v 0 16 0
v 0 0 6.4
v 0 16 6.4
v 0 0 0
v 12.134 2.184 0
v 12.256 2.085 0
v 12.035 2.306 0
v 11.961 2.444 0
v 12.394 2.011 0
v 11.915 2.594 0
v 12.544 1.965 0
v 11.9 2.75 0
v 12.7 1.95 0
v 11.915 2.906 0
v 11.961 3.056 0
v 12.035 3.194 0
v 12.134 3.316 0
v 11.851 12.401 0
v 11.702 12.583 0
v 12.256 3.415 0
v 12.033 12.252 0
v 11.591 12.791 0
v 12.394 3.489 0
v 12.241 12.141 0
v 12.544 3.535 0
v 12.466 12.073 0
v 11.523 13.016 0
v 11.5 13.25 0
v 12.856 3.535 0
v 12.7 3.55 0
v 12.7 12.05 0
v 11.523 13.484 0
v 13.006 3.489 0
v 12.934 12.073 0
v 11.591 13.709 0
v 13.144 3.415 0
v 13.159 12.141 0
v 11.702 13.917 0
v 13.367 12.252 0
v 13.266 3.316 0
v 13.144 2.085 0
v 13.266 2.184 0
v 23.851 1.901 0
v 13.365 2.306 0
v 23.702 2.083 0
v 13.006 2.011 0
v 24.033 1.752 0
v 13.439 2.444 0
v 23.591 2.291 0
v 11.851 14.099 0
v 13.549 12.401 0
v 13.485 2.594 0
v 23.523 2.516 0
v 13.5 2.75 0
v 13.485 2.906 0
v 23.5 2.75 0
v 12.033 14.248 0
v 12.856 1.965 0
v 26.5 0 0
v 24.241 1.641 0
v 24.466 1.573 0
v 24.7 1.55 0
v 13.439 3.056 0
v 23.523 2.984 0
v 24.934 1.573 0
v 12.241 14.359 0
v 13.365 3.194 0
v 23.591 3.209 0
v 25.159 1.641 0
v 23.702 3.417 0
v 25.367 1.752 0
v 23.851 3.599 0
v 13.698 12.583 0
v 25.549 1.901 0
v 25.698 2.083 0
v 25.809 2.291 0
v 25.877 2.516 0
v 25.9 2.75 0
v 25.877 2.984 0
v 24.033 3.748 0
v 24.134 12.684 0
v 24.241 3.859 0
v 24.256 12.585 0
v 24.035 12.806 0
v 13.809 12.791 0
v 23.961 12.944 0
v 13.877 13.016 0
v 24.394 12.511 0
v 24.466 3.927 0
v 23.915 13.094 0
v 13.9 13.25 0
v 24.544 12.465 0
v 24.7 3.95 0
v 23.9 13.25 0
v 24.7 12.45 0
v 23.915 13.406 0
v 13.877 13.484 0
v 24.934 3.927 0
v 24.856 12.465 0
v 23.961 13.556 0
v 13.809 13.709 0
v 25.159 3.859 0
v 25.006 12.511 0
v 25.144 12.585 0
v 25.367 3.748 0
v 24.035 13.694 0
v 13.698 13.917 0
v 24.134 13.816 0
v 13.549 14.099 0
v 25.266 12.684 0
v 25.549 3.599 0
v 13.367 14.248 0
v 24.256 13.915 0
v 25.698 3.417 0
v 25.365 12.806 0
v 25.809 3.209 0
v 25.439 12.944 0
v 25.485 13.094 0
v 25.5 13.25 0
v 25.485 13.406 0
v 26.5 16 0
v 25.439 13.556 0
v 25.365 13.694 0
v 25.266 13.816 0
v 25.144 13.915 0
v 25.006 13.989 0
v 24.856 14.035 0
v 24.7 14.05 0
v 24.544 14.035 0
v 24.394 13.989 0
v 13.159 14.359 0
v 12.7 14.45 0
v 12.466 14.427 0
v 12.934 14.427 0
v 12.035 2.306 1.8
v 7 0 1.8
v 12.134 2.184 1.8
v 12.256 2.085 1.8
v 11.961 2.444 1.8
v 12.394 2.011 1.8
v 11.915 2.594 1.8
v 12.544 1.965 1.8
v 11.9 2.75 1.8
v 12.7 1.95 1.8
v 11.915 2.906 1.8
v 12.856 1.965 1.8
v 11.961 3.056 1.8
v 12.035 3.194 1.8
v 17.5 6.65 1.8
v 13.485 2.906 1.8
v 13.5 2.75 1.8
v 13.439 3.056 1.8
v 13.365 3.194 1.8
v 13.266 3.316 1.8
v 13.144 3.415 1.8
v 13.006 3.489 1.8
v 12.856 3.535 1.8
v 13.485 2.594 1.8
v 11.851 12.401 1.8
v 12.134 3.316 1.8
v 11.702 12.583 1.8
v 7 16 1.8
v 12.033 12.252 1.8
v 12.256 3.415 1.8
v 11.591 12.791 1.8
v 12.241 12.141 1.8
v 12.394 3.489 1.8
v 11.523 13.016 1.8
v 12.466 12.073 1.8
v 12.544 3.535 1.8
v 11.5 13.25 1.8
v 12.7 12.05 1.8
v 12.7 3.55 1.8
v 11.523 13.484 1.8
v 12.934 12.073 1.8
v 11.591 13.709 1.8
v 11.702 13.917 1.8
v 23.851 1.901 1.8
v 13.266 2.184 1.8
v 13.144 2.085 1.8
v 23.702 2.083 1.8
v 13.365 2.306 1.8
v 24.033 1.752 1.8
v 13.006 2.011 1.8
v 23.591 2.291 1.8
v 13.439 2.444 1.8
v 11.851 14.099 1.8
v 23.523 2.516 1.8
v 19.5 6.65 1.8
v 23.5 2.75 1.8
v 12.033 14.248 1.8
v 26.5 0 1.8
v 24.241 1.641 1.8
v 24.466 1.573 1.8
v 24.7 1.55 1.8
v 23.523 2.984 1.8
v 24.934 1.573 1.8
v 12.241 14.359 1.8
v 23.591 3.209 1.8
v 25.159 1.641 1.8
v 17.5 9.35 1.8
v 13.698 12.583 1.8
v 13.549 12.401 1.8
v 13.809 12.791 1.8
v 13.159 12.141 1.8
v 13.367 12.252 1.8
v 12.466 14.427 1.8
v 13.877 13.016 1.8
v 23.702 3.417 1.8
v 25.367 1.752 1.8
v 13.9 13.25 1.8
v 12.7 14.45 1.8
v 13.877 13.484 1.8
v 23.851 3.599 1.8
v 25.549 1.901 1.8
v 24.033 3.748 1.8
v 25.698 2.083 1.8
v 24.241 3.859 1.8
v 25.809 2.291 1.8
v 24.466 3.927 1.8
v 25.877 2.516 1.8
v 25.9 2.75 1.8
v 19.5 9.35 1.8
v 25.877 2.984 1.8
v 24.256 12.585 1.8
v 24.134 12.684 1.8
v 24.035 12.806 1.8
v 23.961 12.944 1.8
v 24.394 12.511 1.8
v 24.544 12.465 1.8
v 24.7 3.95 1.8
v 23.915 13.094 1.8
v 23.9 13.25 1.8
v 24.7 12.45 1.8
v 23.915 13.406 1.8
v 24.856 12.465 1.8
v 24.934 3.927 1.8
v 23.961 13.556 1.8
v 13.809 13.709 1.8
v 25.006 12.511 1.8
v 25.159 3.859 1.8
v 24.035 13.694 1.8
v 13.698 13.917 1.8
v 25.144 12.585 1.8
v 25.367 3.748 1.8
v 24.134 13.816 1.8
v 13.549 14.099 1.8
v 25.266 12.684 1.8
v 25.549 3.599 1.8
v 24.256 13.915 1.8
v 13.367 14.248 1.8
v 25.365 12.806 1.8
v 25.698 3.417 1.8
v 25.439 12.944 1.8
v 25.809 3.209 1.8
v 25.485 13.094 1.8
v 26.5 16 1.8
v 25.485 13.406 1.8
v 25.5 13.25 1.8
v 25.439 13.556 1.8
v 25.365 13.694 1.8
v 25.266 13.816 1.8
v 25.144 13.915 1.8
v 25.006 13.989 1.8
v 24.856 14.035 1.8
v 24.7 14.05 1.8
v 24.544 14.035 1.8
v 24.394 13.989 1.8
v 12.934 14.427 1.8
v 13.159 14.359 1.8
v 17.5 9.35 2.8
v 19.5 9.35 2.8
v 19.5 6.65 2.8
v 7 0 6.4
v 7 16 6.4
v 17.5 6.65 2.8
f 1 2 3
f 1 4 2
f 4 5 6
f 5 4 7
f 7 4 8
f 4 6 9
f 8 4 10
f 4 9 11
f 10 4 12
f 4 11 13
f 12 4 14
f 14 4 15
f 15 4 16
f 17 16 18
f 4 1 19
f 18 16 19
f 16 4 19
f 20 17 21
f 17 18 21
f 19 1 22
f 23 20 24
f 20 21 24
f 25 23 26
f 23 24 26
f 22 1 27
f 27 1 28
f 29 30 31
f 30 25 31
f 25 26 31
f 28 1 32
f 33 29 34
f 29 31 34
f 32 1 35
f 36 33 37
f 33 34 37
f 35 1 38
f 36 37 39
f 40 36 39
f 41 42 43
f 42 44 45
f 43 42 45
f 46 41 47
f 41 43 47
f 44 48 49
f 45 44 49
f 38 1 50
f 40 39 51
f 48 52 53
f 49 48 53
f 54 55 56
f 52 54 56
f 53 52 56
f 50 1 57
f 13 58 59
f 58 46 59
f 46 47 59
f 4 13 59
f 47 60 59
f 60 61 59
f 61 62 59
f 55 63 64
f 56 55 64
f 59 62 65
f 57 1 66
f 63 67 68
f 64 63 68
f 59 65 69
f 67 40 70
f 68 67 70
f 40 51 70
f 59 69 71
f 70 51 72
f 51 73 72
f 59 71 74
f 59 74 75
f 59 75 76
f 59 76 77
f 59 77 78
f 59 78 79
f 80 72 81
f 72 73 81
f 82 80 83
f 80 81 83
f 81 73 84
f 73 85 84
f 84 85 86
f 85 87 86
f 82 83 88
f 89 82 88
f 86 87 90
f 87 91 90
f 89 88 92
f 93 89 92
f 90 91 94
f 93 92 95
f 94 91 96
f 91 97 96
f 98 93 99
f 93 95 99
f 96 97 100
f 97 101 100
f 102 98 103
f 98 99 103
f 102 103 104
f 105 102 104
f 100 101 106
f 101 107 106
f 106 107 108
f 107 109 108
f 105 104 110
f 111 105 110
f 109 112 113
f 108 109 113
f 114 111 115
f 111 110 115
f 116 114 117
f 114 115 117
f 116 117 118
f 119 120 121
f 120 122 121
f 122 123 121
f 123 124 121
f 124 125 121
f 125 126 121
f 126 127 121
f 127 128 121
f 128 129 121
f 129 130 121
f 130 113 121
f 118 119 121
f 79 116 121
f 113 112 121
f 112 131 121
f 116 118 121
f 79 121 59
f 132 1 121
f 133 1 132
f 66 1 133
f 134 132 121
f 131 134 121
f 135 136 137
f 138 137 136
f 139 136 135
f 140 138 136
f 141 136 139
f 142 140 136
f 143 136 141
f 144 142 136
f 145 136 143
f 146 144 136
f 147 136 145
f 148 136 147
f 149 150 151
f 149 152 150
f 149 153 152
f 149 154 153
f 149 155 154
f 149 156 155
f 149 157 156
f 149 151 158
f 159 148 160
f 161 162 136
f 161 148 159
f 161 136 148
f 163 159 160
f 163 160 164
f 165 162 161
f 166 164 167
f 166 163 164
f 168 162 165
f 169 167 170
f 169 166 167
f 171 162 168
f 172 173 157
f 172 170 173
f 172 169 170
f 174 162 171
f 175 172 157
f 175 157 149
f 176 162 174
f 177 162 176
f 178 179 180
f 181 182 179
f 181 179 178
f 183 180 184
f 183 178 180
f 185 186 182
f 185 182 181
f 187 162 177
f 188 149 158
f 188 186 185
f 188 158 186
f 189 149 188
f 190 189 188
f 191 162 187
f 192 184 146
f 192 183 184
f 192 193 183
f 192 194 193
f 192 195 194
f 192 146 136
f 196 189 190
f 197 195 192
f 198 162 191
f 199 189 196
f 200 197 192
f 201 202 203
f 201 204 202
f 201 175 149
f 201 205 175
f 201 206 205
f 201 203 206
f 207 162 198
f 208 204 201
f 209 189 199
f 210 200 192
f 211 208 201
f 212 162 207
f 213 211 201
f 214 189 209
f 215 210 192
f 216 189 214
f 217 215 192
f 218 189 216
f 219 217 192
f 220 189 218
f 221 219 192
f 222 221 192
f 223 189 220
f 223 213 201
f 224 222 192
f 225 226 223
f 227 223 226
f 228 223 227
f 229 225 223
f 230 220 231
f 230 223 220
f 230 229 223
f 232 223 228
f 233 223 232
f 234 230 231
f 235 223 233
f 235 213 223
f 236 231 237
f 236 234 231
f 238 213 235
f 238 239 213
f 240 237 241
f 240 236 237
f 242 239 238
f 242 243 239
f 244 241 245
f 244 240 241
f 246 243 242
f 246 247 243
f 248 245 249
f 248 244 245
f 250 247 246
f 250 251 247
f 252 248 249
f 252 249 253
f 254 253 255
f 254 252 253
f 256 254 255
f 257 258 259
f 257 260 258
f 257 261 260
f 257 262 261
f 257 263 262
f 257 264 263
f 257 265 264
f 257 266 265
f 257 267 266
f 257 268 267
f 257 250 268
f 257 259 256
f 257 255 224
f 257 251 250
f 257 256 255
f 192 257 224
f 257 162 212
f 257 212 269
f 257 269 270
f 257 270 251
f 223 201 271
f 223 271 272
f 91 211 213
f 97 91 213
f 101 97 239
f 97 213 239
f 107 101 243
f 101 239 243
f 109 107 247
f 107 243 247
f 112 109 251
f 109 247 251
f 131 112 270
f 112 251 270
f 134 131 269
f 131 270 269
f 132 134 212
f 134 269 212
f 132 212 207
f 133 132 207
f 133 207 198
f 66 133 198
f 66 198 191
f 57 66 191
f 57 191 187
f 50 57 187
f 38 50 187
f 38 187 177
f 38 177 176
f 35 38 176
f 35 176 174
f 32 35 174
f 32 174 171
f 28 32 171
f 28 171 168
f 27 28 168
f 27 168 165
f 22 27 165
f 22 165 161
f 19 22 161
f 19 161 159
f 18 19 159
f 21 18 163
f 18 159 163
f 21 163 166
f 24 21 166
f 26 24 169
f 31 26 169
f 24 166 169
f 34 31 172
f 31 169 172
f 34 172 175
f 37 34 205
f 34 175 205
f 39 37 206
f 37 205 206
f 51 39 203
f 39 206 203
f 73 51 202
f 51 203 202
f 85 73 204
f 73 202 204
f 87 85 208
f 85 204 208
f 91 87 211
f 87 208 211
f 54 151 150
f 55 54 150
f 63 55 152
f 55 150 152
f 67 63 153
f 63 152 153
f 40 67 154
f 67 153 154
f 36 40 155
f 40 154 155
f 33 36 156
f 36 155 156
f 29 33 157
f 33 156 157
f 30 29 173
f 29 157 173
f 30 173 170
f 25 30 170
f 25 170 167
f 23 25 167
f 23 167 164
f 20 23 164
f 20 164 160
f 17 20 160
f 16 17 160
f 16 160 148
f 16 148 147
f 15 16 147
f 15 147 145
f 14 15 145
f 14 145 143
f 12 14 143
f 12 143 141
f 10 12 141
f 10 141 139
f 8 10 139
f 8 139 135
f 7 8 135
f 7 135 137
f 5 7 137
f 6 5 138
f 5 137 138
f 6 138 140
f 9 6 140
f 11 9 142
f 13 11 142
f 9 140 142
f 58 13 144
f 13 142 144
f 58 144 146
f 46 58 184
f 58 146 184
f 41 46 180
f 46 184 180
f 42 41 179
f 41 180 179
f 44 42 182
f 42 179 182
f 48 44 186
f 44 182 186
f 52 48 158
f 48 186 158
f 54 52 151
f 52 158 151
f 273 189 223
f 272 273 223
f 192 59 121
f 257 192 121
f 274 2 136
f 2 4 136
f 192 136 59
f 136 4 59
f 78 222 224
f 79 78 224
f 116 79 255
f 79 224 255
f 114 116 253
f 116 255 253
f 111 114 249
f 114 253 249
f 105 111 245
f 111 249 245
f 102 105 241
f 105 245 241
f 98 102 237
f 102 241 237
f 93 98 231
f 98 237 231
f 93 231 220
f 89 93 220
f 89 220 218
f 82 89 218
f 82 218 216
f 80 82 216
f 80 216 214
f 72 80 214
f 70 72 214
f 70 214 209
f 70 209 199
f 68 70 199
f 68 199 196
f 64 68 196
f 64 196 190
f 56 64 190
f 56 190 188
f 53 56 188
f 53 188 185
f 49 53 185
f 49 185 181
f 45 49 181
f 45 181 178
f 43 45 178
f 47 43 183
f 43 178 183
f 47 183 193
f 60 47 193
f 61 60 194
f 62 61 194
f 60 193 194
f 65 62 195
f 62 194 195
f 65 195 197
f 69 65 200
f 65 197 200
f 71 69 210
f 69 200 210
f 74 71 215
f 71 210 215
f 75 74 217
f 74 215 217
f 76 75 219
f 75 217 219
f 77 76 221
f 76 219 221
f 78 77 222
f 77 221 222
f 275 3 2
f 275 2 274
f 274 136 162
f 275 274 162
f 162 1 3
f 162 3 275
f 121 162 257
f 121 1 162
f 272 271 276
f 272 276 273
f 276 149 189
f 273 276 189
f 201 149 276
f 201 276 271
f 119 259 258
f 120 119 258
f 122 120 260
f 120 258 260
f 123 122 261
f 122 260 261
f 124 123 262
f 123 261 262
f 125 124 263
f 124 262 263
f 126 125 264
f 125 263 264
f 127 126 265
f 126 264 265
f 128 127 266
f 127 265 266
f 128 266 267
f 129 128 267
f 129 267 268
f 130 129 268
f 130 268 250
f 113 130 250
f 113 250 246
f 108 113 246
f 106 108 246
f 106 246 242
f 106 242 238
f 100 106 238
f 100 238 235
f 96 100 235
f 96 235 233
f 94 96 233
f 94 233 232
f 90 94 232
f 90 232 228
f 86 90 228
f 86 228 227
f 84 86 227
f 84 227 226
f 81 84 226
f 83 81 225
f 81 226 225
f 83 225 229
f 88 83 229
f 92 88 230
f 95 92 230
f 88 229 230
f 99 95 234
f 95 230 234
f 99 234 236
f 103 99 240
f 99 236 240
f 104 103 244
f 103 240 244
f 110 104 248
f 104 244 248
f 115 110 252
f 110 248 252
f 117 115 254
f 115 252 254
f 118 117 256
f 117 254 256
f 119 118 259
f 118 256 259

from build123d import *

# Parameters (mm, degrees)
SKETCH2_W           = 26.5
SKETCH2_H           = 16
BOSS_EXTRUDE1_DEPTH = 1.8
SKETCH3_W           = 7
SKETCH3_H           = 16
BOSS_EXTRUDE2_DEPTH = 4.6
SKETCH4_W           = 2
SKETCH4_H           = 2.7
BOSS_EXTRUDE3_DEPTH = 1
SKETCH5_R           = 0.8
SKETCH5_R_2         = 1.2
CUT_EXTRUDE1_DEPTH  = 2.8


with BuildPart() as part:
    # Sketch2 → Boss-Extrude1 (new body)
    with BuildSketch(Plane.XY):
        with Locations((13.25, 8)):
            Rectangle(SKETCH2_W, SKETCH2_H)
    extrude(amount=BOSS_EXTRUDE1_DEPTH)

    # Sketch3 → Boss-Extrude2 (add)
    with BuildSketch(Plane.XY.offset(1.8)):
        with Locations((3.5, 8)):
            Rectangle(SKETCH3_W, SKETCH3_H)
    extrude(amount=BOSS_EXTRUDE2_DEPTH)

    # Sketch4 → Boss-Extrude3 (add)
    with BuildSketch(Plane.XY.offset(1.8)):
        with Locations((18.5, 8)):
            Rectangle(SKETCH4_W, SKETCH4_H)
    extrude(amount=BOSS_EXTRUDE3_DEPTH)

    # Sketch5 → Cut-Extrude1 (cut, through all)
    with BuildSketch(Plane.XY.offset(1.8)):
        with Locations((24.7, 13.25)):
            Circle(SKETCH5_R)
        with Locations((12.7, 2.75)):
            Circle(SKETCH5_R)
        with Locations((24.7, 2.75)):
            Circle(SKETCH5_R_2)
        with Locations((12.7, 13.25)):
            Circle(SKETCH5_R_2)
    extrude(amount=-CUT_EXTRUDE1_DEPTH, mode=Mode.SUBTRACT)


solid = part.part
